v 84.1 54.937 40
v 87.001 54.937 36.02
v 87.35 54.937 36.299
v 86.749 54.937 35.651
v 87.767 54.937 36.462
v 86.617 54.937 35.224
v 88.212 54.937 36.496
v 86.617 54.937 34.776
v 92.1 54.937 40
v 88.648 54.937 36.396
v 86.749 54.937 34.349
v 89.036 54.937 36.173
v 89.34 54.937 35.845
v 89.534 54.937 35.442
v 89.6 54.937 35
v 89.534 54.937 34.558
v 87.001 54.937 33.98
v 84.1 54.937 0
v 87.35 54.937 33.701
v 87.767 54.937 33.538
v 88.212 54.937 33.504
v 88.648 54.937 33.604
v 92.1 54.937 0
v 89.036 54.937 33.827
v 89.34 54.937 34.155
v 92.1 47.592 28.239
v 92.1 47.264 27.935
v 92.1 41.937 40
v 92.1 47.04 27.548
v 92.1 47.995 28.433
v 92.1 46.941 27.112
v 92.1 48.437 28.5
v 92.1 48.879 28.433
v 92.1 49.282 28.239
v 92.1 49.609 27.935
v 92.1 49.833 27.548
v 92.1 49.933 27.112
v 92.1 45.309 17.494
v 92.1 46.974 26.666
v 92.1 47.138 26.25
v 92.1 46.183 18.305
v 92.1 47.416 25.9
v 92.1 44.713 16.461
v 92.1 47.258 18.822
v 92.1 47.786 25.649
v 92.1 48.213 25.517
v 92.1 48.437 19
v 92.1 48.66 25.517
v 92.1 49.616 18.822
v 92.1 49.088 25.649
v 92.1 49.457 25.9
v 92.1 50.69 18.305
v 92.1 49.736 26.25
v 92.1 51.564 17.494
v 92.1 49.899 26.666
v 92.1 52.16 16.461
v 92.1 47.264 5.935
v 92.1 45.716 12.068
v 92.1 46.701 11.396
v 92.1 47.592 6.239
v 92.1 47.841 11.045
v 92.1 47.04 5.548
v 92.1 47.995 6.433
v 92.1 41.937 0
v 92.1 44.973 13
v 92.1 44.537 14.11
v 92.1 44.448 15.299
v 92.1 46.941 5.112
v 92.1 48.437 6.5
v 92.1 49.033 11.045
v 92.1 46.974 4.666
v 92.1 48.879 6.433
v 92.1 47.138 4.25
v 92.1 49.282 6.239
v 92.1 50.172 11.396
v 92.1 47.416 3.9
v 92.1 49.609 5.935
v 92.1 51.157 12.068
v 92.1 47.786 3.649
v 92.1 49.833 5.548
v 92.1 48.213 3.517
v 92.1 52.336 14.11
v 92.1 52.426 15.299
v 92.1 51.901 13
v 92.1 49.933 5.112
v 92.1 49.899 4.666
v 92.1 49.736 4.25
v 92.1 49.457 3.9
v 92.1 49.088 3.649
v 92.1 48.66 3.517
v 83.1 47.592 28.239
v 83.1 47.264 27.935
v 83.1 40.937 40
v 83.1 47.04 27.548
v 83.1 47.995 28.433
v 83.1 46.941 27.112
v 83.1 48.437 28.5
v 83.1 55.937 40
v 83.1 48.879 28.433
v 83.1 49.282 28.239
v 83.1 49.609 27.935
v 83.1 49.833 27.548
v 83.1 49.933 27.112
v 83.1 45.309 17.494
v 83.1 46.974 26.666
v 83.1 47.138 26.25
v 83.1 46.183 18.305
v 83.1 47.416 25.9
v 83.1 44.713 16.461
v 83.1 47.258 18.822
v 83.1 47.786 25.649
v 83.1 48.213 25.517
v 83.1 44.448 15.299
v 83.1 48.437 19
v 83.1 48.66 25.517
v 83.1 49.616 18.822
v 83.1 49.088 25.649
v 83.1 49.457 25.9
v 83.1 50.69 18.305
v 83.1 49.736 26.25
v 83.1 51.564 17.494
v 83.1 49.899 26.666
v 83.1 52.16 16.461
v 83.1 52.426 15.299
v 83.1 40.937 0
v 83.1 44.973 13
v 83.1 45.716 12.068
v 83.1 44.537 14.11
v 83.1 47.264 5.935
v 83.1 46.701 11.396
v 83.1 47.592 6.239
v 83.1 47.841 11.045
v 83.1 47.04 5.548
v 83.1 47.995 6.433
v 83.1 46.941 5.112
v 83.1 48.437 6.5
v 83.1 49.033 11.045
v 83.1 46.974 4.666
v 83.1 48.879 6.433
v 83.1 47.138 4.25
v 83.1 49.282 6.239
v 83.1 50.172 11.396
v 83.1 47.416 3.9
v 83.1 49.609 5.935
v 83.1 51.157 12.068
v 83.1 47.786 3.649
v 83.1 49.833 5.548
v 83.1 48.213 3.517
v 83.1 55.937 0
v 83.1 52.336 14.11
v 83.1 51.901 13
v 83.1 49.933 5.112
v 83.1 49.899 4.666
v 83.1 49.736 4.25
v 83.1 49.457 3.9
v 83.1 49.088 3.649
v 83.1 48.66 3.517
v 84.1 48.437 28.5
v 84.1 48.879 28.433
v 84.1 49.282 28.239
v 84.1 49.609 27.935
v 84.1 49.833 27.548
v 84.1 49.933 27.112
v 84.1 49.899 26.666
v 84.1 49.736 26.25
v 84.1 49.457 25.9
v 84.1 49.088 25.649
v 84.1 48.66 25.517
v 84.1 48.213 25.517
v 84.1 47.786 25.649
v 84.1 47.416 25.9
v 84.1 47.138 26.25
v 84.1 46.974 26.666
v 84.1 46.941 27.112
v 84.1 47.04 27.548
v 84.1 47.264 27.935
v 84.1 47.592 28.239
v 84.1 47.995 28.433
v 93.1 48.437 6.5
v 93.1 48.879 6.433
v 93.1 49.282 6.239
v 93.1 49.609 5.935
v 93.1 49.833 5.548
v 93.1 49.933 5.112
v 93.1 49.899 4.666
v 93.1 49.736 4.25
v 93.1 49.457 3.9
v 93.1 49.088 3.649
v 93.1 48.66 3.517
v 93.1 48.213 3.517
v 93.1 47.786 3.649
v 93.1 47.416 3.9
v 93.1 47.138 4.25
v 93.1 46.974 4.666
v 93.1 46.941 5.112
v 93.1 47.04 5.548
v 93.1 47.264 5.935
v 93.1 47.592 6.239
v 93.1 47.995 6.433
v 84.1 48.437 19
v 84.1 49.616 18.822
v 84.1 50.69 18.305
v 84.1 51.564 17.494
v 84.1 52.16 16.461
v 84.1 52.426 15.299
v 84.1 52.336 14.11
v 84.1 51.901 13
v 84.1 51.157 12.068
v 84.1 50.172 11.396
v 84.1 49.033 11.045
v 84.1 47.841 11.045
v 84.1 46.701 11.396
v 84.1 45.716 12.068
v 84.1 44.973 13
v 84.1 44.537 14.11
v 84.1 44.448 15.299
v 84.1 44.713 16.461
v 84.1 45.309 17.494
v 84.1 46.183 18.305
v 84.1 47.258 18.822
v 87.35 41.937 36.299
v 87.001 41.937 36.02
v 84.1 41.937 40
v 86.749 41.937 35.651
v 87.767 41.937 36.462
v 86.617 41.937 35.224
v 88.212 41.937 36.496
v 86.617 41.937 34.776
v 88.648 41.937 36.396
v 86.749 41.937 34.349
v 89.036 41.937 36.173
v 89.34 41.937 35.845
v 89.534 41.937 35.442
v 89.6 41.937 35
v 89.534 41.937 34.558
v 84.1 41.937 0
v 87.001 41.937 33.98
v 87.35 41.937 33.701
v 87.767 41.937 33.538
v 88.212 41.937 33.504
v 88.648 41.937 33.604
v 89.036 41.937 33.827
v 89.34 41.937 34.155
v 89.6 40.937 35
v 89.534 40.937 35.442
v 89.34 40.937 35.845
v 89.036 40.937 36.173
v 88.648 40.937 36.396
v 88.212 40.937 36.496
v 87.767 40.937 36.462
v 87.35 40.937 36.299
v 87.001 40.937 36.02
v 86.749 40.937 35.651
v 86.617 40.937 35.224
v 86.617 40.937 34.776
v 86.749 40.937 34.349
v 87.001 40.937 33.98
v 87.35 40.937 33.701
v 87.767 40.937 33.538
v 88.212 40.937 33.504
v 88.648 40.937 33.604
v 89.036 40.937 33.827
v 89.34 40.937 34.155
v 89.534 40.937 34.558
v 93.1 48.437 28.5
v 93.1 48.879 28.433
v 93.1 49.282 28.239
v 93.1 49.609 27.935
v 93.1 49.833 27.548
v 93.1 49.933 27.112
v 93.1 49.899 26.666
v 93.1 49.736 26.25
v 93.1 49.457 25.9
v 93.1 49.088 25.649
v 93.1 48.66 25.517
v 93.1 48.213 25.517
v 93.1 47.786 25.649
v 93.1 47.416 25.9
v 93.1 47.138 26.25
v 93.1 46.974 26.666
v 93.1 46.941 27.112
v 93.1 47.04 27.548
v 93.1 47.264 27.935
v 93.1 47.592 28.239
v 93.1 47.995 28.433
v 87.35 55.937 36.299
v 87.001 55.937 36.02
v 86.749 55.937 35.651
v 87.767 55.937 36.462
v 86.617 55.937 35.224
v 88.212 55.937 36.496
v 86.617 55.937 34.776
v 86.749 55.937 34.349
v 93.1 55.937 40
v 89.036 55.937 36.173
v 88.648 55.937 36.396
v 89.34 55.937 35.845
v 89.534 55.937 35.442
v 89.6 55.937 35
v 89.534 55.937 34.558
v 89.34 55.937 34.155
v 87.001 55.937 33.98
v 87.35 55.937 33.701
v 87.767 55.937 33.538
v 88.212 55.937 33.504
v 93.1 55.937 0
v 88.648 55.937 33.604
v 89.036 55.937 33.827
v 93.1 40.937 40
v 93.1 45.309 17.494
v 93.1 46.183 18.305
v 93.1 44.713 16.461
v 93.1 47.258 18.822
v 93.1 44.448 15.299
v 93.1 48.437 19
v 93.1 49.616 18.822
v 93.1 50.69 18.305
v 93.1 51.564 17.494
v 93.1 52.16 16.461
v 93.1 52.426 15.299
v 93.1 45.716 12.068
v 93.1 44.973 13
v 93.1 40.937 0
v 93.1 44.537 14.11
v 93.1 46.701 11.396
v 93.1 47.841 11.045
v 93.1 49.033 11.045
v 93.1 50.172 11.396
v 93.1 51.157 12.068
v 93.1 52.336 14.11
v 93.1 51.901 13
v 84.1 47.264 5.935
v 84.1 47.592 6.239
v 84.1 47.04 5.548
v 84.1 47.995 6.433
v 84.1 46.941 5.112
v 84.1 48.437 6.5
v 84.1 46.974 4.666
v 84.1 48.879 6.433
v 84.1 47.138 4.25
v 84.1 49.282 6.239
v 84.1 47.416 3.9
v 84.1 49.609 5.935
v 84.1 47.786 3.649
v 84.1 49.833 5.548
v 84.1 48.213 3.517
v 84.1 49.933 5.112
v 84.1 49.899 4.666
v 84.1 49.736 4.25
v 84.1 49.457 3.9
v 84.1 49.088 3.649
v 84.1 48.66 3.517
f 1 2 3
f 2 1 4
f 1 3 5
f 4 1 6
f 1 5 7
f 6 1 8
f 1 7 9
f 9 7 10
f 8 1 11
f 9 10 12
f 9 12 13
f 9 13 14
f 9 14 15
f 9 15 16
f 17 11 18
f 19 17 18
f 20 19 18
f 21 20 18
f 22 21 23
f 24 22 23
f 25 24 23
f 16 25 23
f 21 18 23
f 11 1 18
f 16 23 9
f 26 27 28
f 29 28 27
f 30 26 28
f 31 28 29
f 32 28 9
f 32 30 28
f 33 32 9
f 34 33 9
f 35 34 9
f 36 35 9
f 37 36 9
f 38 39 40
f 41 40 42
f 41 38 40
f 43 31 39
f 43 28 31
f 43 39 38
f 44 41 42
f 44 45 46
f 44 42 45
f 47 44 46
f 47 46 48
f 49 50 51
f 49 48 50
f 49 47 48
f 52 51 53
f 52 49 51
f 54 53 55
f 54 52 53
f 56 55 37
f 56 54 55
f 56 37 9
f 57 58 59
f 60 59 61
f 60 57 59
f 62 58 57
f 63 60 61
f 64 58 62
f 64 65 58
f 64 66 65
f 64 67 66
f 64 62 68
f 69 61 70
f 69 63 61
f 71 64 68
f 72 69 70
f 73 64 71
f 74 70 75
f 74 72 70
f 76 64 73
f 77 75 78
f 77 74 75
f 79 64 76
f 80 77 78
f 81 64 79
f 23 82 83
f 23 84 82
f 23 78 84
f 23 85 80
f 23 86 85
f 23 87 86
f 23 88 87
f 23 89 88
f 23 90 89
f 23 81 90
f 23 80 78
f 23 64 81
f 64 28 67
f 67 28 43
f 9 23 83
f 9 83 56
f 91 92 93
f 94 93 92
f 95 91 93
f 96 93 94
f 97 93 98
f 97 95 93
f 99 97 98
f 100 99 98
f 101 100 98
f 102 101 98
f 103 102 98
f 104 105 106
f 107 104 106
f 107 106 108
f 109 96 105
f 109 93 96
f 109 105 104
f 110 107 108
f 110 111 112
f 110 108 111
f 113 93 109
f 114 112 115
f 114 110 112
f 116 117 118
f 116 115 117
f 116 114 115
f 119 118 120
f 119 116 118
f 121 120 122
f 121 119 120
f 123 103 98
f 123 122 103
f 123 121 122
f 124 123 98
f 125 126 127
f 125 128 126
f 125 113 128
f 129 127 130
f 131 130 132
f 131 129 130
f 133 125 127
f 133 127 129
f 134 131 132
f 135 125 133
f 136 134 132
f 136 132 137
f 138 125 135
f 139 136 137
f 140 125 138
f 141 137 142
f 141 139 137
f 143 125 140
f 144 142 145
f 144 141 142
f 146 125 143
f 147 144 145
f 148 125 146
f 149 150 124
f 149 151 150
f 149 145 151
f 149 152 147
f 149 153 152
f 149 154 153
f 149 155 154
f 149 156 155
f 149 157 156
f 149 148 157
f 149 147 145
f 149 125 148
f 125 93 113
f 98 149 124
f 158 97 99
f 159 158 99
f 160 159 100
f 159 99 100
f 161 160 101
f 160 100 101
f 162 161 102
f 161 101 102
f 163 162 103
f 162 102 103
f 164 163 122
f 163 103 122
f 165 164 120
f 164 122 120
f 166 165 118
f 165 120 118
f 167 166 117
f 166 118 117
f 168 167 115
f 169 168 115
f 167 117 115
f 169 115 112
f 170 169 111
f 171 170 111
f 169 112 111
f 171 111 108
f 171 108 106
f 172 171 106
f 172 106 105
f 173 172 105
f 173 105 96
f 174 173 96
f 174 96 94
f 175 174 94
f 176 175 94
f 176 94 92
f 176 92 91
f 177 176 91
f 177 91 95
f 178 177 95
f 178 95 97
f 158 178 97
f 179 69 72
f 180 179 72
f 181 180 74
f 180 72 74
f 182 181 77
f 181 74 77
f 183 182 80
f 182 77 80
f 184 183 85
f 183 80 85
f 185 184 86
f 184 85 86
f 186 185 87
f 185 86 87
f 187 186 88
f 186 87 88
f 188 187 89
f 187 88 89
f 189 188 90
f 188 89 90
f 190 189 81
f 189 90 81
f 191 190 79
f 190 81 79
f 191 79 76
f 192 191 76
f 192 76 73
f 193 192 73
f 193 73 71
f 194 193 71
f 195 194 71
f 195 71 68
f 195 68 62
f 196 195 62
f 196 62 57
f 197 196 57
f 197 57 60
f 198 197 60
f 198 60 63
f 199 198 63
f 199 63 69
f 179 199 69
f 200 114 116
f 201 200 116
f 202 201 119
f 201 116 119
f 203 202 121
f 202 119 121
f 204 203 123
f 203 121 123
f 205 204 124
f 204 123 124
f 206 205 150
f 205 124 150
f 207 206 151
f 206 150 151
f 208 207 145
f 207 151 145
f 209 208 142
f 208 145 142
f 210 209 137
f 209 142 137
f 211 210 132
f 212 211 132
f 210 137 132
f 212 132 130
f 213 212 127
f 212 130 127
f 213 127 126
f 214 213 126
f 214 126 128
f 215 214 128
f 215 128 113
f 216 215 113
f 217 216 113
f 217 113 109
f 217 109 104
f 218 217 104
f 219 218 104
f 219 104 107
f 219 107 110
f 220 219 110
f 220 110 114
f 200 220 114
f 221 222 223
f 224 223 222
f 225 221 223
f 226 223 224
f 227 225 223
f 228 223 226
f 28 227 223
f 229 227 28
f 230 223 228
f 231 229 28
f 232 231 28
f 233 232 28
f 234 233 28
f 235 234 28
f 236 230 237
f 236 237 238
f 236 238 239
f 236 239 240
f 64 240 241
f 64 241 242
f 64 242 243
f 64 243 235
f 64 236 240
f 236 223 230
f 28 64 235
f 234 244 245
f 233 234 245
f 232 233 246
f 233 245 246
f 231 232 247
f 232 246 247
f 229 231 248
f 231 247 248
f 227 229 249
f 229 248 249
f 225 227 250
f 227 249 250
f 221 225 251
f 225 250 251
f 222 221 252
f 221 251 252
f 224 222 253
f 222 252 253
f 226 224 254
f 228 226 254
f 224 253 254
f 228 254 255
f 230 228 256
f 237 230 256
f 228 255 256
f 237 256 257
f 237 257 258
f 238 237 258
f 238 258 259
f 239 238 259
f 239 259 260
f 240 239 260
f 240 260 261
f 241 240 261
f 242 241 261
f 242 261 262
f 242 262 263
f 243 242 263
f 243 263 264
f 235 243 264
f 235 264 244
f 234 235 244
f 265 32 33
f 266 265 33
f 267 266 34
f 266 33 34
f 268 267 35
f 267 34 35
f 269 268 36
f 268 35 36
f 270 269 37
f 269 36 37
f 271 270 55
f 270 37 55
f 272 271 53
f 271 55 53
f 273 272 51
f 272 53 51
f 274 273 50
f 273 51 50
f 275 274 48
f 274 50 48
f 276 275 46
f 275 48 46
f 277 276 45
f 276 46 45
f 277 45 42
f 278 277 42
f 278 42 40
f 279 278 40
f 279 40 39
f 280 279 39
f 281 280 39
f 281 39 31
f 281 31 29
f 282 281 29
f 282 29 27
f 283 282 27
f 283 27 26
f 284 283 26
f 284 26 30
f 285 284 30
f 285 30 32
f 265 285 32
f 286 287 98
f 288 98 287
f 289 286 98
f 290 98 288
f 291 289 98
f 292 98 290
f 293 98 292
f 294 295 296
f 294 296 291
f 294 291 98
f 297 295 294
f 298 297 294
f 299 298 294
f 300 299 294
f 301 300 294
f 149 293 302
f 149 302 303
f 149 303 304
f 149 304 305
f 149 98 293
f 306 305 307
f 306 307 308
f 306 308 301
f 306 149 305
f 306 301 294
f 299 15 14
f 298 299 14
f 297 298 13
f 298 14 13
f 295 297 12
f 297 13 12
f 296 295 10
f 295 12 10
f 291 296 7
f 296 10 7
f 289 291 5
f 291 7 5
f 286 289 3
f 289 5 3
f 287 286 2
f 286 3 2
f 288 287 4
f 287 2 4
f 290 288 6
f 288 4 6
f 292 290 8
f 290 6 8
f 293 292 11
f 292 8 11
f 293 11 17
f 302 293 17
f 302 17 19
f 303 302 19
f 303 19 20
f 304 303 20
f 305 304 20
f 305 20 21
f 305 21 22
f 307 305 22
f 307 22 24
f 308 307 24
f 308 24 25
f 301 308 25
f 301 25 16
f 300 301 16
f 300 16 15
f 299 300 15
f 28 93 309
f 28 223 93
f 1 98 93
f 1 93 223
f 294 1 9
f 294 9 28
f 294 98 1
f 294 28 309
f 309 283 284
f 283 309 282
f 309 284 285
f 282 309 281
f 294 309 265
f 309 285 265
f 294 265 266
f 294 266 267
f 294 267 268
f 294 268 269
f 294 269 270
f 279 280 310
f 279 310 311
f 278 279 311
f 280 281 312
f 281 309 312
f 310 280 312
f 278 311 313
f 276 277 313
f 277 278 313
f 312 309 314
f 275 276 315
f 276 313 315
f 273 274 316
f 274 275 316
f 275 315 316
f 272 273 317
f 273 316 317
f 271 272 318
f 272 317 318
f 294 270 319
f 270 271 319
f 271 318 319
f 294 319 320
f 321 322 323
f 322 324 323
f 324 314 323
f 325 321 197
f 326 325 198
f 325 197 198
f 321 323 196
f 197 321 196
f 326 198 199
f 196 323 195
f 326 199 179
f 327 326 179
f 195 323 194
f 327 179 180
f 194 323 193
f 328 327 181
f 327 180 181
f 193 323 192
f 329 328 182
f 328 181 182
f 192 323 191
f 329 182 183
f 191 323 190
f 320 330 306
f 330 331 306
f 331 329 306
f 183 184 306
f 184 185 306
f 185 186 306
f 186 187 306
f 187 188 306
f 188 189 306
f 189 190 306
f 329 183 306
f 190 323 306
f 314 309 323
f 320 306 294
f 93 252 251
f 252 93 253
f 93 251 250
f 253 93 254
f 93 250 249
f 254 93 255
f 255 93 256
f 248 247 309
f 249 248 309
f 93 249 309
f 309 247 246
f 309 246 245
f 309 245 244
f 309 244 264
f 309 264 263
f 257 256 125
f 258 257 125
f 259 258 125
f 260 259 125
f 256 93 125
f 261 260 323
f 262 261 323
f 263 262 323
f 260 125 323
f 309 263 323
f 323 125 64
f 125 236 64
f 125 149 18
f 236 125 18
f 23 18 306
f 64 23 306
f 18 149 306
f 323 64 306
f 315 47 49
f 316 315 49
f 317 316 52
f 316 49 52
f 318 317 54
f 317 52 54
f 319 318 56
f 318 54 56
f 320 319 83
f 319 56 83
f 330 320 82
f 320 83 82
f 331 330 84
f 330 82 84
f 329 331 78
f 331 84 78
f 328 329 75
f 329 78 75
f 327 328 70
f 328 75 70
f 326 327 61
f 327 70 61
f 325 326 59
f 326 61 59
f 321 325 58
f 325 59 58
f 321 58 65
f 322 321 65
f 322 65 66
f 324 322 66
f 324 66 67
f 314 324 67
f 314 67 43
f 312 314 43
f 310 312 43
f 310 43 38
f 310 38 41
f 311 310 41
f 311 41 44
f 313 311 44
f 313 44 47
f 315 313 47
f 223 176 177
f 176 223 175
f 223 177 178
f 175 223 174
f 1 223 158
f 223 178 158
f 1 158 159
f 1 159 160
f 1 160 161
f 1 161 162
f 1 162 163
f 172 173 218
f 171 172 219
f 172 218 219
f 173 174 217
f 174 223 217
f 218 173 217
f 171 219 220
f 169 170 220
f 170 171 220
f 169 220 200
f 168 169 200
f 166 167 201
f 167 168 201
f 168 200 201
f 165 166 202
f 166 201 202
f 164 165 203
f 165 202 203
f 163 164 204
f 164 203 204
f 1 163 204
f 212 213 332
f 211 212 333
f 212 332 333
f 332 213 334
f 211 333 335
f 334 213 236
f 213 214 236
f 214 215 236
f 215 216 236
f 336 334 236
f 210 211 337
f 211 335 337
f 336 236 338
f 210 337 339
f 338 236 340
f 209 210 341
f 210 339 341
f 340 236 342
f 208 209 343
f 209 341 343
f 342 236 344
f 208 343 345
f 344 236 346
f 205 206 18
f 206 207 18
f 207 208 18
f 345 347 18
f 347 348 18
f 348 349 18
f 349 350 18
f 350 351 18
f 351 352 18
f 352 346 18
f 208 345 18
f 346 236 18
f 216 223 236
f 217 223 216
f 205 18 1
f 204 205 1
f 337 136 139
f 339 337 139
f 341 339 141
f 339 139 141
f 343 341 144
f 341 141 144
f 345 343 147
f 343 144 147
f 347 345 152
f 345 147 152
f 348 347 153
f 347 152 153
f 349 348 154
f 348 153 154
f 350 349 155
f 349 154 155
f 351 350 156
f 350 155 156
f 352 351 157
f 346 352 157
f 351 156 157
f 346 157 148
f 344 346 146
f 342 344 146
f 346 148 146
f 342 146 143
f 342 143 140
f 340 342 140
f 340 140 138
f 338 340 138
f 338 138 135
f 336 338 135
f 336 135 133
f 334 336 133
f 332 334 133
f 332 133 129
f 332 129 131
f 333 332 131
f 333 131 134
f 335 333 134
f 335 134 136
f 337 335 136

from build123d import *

# Parameters (mm, degrees)
SKETCH_1_W          = 10
SKETCH_1_H          = 15
SKETCH_1_W_2        = 8
SKETCH_1_H_2        = 13
EXTRUDE_1_DEPTH     = 40
SKETCH_2_R          = 1.5
SKETCH_2_R_2        = 4
CUT_EXTRUDE_1_DEPTH = 11
SKETCH_3_R          = 1.5
CUT_EXTRUDE_2_DEPTH = 16


with BuildPart() as part:
    # 草图1 → 拉伸-薄壁1 (new body)
    with BuildSketch(Plane.XY):
        with Locations((88.100313923, 48.436702161)):
            Rectangle(SKETCH_1_W, SKETCH_1_H)
        with Locations((88.100313923, 48.436702161)):
            Rectangle(SKETCH_1_W_2, SKETCH_1_H_2, mode=Mode.SUBTRACT)
    extrude(amount=EXTRUDE_1_DEPTH)

    # 草图2 → 切除-拉伸1 (cut, through all)
    with BuildSketch(Plane.ZY.offset(-83.100313923)):
        with Locations((5, 48.436702161)):
            Circle(SKETCH_2_R)
        with Locations((27, 48.436702161)):
            Circle(SKETCH_2_R)
        with Locations((15, 48.436702161)):
            Circle(SKETCH_2_R_2)
    extrude(amount=-CUT_EXTRUDE_1_DEPTH, mode=Mode.SUBTRACT)

    # 草图3 → 切除-拉伸2 (cut, through all)
    with BuildSketch(Plane.XZ.offset(-40.936702161)):
        with Locations((88.100313923, 35)):
            Circle(SKETCH_3_R)
    extrude(amount=-CUT_EXTRUDE_2_DEPTH, mode=Mode.SUBTRACT)


solid = part.part
